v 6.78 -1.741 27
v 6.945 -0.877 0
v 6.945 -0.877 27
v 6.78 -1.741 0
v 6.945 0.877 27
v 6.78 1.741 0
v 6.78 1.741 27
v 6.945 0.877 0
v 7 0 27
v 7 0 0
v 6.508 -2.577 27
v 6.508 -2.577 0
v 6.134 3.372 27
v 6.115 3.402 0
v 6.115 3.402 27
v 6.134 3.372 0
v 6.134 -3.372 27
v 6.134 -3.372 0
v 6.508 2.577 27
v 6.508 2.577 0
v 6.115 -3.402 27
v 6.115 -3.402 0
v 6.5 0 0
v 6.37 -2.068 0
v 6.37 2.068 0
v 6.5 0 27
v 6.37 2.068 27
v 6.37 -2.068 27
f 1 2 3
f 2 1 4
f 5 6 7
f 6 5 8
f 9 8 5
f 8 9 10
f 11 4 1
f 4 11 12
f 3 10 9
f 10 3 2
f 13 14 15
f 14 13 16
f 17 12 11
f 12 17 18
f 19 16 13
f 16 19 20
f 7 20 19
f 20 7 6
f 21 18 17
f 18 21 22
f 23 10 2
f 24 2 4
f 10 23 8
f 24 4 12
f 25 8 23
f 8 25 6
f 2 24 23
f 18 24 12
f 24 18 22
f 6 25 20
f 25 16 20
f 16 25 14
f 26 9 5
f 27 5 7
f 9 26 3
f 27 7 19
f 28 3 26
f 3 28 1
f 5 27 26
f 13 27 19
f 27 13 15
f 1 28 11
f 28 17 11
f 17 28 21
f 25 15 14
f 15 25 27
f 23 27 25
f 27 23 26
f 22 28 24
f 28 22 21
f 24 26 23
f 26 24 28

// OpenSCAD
$fn = 50;


difference() {
	union() {
		cylinder(h = 27, r = 7.0000000000);
		translate(v = [-13.0000000000, 0, 0]) {
			cylinder(h = 27, r = 7.0000000000);
		}
	}
	union() {
		cylinder(h = 27, r = 3.2500000000);
		cylinder(h = 27, r = 1.8000000000);
		cylinder(h = 27, r = 1.8000000000);
		cylinder(h = 27, r = 1.8000000000);
		translate(v = [-17.5000000000, 0, 0]) {
			hull() {
				translate(v = [-3.7500000000, 0.0000000000, 0]) {
					cylinder(h = 27, r = 10.5000000000);
				}
				translate(v = [3.7500000000, 0.0000000000, 0]) {
					cylinder(h = 27, r = 10.5000000000);
				}
				translate(v = [-3.7500000000, -0.0000000000, 0]) {
					cylinder(h = 27, r = 10.5000000000);
				}
				translate(v = [3.7500000000, -0.0000000000, 0]) {
					cylinder(h = 27, r = 10.5000000000);
				}
			}
		}
		translate(v = [-10.0000000000, 0, 0.0000000000]) {
			cylinder(h = 27, r = 16.5000000000);
		}
	}
}
